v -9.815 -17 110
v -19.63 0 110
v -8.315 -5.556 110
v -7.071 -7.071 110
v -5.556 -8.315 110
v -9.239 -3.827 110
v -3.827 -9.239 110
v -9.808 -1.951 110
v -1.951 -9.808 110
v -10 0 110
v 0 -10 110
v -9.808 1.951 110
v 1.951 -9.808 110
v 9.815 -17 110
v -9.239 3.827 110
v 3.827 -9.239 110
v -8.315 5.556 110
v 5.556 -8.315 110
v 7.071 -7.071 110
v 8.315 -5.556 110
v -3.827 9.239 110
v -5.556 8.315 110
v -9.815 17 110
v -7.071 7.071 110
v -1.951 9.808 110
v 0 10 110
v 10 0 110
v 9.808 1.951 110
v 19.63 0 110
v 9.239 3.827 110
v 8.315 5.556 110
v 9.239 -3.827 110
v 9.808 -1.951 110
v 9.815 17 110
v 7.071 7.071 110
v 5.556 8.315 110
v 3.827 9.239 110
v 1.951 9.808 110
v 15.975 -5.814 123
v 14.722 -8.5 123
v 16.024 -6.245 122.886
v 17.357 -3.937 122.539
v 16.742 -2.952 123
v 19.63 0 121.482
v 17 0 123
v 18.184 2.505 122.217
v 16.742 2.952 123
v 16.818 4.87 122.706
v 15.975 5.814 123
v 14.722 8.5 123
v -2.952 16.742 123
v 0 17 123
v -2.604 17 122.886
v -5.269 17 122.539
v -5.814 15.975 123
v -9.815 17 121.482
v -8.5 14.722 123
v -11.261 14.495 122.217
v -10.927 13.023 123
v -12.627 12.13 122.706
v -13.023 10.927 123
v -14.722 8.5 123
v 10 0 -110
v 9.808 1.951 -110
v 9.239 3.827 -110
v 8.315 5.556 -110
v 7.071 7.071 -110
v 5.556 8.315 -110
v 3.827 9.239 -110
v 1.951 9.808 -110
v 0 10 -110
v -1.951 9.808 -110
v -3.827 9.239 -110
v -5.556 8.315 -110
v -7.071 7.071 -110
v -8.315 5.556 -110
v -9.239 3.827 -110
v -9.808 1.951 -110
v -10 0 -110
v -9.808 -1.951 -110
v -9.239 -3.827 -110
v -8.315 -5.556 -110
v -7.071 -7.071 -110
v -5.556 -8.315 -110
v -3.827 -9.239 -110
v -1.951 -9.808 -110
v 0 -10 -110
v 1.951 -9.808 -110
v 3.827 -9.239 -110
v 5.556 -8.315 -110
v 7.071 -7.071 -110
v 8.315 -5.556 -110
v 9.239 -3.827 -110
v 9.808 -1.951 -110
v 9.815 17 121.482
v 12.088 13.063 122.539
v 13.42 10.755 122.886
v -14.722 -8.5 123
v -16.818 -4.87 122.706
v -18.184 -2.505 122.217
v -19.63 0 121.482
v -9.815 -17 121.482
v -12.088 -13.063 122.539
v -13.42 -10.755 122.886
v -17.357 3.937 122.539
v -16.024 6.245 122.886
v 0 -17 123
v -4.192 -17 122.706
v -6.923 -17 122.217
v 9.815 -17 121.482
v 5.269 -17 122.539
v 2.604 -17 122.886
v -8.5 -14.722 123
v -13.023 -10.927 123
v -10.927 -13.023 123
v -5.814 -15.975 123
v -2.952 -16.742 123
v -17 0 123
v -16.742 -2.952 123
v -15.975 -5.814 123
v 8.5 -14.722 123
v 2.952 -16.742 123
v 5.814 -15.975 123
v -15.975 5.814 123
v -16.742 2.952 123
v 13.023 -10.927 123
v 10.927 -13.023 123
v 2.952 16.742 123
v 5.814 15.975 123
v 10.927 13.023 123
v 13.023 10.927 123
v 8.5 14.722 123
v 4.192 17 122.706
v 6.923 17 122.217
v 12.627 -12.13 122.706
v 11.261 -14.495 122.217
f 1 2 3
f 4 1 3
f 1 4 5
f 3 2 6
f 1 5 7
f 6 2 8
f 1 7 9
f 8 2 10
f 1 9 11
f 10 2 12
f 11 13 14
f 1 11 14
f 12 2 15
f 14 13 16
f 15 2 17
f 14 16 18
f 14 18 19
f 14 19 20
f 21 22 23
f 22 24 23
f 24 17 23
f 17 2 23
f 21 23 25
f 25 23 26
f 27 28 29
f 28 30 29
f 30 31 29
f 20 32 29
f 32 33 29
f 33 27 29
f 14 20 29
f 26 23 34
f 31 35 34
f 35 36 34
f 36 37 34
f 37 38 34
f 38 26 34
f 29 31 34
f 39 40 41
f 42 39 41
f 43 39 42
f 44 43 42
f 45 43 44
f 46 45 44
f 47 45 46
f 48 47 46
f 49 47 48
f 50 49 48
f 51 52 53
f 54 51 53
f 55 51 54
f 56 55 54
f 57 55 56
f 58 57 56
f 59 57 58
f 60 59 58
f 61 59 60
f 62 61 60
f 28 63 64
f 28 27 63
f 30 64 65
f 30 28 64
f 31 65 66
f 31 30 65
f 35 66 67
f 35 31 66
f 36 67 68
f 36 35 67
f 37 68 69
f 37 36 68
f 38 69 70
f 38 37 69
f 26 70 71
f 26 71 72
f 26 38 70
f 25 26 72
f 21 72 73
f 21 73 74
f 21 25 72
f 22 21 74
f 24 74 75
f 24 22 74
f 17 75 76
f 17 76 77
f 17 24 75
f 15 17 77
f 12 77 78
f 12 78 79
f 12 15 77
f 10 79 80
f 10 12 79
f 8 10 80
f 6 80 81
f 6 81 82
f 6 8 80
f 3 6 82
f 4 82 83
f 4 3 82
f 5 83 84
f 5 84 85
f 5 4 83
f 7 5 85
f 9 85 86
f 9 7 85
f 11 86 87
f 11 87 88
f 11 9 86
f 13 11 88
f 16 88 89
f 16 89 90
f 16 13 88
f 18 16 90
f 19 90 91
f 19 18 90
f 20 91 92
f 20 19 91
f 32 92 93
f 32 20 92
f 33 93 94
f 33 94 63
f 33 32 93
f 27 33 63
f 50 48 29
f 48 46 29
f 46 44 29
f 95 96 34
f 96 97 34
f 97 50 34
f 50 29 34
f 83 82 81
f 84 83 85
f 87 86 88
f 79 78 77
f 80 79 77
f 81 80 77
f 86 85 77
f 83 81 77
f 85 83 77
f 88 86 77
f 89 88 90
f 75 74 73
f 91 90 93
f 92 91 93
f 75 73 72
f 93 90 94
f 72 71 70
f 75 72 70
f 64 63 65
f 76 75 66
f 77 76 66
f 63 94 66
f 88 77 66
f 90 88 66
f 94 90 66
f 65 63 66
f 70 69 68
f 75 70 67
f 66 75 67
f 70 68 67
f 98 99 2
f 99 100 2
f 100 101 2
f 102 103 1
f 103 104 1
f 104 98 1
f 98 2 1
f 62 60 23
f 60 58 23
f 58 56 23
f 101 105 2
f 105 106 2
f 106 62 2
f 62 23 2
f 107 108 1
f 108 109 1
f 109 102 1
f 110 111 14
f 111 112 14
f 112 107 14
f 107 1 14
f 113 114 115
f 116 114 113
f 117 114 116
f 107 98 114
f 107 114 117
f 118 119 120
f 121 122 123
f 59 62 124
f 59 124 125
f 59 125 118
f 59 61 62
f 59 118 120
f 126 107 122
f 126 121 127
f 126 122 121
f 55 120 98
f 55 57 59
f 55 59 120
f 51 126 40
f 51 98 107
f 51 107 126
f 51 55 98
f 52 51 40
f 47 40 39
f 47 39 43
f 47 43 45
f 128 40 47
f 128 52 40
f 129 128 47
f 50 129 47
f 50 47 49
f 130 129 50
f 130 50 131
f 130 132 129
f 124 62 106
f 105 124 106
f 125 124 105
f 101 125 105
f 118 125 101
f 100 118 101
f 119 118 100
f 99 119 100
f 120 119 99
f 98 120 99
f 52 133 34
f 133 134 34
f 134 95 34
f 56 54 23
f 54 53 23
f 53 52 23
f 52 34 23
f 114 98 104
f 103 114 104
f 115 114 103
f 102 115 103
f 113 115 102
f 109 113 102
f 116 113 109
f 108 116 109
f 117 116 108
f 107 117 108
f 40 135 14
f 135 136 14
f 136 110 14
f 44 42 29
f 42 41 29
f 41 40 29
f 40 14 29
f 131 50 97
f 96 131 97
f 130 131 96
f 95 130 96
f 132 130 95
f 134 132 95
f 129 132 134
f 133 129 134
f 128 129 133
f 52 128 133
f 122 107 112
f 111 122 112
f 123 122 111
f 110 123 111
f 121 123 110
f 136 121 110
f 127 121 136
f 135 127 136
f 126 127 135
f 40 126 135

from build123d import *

# Parameters (mm, degrees)
SKETCH1_R           = 10
BOSS_EXTRUDE1_DEPTH = 110
BOSS_EXTRUDE2_DEPTH = 13
SKETCH3_OUTSIDE_W   = 134.036
SKETCH3_OUTSIDE_H   = 128.776
SKETCH3_OUTSIDE_R   = 17
CUT_EXTRUDE1_DEPTH  = 13
CUT_EXTRUDE1_DRAFT  = -60


with BuildPart() as part:
    # Sketch1 → Boss-Extrude1 (new, symmetric)
    with BuildSketch(Plane.XY):
        Circle(SKETCH1_R)
    extrude(amount=BOSS_EXTRUDE1_DEPTH, both=True)

    # Sketch2 → Boss-Extrude2 (add)
    with BuildSketch(Plane.XY.offset(110)):
        Polygon((-19.629909152, 0), (-9.814954576, -17), (9.814954576, -17), (19.629909152, 0), (9.814954576, 17), (-9.814954576, 17), align=None)
    extrude(amount=BOSS_EXTRUDE2_DEPTH)


with BuildPart() as cut_extrude1_tool:
    # Sketch3 outside → Cut-Extrude1 (with draft: the straight prism first)
    with BuildSketch(Plane.XY.offset(123)):
        Rectangle(SKETCH3_OUTSIDE_W, SKETCH3_OUTSIDE_H)
        Circle(SKETCH3_OUTSIDE_R, mode=Mode.SUBTRACT)
    extrude(amount=-CUT_EXTRUDE1_DEPTH)
    # Cut-Extrude1: the draft: its side faces are tilted about the plane it starts from
    cut_extrude1_sides = [cut_extrude1_tool.faces().sort_by_distance(p)[0] for p in [
        (0, -64.388, 116.5),
        (67.018, 0, 116.5),
        (0, 64.388, 116.5),
        (-67.018, 0, 116.5),
        (-17, 0, 116.5),
    ]]
    draft(cut_extrude1_sides, Plane.XY.offset(123), CUT_EXTRUDE1_DRAFT)


with BuildPart() as part_1:
    add(part.part)

    # Cut-Extrude1: cut by cut_extrude1_tool
    add(cut_extrude1_tool.part, mode=Mode.SUBTRACT)


solid = part_1.part
